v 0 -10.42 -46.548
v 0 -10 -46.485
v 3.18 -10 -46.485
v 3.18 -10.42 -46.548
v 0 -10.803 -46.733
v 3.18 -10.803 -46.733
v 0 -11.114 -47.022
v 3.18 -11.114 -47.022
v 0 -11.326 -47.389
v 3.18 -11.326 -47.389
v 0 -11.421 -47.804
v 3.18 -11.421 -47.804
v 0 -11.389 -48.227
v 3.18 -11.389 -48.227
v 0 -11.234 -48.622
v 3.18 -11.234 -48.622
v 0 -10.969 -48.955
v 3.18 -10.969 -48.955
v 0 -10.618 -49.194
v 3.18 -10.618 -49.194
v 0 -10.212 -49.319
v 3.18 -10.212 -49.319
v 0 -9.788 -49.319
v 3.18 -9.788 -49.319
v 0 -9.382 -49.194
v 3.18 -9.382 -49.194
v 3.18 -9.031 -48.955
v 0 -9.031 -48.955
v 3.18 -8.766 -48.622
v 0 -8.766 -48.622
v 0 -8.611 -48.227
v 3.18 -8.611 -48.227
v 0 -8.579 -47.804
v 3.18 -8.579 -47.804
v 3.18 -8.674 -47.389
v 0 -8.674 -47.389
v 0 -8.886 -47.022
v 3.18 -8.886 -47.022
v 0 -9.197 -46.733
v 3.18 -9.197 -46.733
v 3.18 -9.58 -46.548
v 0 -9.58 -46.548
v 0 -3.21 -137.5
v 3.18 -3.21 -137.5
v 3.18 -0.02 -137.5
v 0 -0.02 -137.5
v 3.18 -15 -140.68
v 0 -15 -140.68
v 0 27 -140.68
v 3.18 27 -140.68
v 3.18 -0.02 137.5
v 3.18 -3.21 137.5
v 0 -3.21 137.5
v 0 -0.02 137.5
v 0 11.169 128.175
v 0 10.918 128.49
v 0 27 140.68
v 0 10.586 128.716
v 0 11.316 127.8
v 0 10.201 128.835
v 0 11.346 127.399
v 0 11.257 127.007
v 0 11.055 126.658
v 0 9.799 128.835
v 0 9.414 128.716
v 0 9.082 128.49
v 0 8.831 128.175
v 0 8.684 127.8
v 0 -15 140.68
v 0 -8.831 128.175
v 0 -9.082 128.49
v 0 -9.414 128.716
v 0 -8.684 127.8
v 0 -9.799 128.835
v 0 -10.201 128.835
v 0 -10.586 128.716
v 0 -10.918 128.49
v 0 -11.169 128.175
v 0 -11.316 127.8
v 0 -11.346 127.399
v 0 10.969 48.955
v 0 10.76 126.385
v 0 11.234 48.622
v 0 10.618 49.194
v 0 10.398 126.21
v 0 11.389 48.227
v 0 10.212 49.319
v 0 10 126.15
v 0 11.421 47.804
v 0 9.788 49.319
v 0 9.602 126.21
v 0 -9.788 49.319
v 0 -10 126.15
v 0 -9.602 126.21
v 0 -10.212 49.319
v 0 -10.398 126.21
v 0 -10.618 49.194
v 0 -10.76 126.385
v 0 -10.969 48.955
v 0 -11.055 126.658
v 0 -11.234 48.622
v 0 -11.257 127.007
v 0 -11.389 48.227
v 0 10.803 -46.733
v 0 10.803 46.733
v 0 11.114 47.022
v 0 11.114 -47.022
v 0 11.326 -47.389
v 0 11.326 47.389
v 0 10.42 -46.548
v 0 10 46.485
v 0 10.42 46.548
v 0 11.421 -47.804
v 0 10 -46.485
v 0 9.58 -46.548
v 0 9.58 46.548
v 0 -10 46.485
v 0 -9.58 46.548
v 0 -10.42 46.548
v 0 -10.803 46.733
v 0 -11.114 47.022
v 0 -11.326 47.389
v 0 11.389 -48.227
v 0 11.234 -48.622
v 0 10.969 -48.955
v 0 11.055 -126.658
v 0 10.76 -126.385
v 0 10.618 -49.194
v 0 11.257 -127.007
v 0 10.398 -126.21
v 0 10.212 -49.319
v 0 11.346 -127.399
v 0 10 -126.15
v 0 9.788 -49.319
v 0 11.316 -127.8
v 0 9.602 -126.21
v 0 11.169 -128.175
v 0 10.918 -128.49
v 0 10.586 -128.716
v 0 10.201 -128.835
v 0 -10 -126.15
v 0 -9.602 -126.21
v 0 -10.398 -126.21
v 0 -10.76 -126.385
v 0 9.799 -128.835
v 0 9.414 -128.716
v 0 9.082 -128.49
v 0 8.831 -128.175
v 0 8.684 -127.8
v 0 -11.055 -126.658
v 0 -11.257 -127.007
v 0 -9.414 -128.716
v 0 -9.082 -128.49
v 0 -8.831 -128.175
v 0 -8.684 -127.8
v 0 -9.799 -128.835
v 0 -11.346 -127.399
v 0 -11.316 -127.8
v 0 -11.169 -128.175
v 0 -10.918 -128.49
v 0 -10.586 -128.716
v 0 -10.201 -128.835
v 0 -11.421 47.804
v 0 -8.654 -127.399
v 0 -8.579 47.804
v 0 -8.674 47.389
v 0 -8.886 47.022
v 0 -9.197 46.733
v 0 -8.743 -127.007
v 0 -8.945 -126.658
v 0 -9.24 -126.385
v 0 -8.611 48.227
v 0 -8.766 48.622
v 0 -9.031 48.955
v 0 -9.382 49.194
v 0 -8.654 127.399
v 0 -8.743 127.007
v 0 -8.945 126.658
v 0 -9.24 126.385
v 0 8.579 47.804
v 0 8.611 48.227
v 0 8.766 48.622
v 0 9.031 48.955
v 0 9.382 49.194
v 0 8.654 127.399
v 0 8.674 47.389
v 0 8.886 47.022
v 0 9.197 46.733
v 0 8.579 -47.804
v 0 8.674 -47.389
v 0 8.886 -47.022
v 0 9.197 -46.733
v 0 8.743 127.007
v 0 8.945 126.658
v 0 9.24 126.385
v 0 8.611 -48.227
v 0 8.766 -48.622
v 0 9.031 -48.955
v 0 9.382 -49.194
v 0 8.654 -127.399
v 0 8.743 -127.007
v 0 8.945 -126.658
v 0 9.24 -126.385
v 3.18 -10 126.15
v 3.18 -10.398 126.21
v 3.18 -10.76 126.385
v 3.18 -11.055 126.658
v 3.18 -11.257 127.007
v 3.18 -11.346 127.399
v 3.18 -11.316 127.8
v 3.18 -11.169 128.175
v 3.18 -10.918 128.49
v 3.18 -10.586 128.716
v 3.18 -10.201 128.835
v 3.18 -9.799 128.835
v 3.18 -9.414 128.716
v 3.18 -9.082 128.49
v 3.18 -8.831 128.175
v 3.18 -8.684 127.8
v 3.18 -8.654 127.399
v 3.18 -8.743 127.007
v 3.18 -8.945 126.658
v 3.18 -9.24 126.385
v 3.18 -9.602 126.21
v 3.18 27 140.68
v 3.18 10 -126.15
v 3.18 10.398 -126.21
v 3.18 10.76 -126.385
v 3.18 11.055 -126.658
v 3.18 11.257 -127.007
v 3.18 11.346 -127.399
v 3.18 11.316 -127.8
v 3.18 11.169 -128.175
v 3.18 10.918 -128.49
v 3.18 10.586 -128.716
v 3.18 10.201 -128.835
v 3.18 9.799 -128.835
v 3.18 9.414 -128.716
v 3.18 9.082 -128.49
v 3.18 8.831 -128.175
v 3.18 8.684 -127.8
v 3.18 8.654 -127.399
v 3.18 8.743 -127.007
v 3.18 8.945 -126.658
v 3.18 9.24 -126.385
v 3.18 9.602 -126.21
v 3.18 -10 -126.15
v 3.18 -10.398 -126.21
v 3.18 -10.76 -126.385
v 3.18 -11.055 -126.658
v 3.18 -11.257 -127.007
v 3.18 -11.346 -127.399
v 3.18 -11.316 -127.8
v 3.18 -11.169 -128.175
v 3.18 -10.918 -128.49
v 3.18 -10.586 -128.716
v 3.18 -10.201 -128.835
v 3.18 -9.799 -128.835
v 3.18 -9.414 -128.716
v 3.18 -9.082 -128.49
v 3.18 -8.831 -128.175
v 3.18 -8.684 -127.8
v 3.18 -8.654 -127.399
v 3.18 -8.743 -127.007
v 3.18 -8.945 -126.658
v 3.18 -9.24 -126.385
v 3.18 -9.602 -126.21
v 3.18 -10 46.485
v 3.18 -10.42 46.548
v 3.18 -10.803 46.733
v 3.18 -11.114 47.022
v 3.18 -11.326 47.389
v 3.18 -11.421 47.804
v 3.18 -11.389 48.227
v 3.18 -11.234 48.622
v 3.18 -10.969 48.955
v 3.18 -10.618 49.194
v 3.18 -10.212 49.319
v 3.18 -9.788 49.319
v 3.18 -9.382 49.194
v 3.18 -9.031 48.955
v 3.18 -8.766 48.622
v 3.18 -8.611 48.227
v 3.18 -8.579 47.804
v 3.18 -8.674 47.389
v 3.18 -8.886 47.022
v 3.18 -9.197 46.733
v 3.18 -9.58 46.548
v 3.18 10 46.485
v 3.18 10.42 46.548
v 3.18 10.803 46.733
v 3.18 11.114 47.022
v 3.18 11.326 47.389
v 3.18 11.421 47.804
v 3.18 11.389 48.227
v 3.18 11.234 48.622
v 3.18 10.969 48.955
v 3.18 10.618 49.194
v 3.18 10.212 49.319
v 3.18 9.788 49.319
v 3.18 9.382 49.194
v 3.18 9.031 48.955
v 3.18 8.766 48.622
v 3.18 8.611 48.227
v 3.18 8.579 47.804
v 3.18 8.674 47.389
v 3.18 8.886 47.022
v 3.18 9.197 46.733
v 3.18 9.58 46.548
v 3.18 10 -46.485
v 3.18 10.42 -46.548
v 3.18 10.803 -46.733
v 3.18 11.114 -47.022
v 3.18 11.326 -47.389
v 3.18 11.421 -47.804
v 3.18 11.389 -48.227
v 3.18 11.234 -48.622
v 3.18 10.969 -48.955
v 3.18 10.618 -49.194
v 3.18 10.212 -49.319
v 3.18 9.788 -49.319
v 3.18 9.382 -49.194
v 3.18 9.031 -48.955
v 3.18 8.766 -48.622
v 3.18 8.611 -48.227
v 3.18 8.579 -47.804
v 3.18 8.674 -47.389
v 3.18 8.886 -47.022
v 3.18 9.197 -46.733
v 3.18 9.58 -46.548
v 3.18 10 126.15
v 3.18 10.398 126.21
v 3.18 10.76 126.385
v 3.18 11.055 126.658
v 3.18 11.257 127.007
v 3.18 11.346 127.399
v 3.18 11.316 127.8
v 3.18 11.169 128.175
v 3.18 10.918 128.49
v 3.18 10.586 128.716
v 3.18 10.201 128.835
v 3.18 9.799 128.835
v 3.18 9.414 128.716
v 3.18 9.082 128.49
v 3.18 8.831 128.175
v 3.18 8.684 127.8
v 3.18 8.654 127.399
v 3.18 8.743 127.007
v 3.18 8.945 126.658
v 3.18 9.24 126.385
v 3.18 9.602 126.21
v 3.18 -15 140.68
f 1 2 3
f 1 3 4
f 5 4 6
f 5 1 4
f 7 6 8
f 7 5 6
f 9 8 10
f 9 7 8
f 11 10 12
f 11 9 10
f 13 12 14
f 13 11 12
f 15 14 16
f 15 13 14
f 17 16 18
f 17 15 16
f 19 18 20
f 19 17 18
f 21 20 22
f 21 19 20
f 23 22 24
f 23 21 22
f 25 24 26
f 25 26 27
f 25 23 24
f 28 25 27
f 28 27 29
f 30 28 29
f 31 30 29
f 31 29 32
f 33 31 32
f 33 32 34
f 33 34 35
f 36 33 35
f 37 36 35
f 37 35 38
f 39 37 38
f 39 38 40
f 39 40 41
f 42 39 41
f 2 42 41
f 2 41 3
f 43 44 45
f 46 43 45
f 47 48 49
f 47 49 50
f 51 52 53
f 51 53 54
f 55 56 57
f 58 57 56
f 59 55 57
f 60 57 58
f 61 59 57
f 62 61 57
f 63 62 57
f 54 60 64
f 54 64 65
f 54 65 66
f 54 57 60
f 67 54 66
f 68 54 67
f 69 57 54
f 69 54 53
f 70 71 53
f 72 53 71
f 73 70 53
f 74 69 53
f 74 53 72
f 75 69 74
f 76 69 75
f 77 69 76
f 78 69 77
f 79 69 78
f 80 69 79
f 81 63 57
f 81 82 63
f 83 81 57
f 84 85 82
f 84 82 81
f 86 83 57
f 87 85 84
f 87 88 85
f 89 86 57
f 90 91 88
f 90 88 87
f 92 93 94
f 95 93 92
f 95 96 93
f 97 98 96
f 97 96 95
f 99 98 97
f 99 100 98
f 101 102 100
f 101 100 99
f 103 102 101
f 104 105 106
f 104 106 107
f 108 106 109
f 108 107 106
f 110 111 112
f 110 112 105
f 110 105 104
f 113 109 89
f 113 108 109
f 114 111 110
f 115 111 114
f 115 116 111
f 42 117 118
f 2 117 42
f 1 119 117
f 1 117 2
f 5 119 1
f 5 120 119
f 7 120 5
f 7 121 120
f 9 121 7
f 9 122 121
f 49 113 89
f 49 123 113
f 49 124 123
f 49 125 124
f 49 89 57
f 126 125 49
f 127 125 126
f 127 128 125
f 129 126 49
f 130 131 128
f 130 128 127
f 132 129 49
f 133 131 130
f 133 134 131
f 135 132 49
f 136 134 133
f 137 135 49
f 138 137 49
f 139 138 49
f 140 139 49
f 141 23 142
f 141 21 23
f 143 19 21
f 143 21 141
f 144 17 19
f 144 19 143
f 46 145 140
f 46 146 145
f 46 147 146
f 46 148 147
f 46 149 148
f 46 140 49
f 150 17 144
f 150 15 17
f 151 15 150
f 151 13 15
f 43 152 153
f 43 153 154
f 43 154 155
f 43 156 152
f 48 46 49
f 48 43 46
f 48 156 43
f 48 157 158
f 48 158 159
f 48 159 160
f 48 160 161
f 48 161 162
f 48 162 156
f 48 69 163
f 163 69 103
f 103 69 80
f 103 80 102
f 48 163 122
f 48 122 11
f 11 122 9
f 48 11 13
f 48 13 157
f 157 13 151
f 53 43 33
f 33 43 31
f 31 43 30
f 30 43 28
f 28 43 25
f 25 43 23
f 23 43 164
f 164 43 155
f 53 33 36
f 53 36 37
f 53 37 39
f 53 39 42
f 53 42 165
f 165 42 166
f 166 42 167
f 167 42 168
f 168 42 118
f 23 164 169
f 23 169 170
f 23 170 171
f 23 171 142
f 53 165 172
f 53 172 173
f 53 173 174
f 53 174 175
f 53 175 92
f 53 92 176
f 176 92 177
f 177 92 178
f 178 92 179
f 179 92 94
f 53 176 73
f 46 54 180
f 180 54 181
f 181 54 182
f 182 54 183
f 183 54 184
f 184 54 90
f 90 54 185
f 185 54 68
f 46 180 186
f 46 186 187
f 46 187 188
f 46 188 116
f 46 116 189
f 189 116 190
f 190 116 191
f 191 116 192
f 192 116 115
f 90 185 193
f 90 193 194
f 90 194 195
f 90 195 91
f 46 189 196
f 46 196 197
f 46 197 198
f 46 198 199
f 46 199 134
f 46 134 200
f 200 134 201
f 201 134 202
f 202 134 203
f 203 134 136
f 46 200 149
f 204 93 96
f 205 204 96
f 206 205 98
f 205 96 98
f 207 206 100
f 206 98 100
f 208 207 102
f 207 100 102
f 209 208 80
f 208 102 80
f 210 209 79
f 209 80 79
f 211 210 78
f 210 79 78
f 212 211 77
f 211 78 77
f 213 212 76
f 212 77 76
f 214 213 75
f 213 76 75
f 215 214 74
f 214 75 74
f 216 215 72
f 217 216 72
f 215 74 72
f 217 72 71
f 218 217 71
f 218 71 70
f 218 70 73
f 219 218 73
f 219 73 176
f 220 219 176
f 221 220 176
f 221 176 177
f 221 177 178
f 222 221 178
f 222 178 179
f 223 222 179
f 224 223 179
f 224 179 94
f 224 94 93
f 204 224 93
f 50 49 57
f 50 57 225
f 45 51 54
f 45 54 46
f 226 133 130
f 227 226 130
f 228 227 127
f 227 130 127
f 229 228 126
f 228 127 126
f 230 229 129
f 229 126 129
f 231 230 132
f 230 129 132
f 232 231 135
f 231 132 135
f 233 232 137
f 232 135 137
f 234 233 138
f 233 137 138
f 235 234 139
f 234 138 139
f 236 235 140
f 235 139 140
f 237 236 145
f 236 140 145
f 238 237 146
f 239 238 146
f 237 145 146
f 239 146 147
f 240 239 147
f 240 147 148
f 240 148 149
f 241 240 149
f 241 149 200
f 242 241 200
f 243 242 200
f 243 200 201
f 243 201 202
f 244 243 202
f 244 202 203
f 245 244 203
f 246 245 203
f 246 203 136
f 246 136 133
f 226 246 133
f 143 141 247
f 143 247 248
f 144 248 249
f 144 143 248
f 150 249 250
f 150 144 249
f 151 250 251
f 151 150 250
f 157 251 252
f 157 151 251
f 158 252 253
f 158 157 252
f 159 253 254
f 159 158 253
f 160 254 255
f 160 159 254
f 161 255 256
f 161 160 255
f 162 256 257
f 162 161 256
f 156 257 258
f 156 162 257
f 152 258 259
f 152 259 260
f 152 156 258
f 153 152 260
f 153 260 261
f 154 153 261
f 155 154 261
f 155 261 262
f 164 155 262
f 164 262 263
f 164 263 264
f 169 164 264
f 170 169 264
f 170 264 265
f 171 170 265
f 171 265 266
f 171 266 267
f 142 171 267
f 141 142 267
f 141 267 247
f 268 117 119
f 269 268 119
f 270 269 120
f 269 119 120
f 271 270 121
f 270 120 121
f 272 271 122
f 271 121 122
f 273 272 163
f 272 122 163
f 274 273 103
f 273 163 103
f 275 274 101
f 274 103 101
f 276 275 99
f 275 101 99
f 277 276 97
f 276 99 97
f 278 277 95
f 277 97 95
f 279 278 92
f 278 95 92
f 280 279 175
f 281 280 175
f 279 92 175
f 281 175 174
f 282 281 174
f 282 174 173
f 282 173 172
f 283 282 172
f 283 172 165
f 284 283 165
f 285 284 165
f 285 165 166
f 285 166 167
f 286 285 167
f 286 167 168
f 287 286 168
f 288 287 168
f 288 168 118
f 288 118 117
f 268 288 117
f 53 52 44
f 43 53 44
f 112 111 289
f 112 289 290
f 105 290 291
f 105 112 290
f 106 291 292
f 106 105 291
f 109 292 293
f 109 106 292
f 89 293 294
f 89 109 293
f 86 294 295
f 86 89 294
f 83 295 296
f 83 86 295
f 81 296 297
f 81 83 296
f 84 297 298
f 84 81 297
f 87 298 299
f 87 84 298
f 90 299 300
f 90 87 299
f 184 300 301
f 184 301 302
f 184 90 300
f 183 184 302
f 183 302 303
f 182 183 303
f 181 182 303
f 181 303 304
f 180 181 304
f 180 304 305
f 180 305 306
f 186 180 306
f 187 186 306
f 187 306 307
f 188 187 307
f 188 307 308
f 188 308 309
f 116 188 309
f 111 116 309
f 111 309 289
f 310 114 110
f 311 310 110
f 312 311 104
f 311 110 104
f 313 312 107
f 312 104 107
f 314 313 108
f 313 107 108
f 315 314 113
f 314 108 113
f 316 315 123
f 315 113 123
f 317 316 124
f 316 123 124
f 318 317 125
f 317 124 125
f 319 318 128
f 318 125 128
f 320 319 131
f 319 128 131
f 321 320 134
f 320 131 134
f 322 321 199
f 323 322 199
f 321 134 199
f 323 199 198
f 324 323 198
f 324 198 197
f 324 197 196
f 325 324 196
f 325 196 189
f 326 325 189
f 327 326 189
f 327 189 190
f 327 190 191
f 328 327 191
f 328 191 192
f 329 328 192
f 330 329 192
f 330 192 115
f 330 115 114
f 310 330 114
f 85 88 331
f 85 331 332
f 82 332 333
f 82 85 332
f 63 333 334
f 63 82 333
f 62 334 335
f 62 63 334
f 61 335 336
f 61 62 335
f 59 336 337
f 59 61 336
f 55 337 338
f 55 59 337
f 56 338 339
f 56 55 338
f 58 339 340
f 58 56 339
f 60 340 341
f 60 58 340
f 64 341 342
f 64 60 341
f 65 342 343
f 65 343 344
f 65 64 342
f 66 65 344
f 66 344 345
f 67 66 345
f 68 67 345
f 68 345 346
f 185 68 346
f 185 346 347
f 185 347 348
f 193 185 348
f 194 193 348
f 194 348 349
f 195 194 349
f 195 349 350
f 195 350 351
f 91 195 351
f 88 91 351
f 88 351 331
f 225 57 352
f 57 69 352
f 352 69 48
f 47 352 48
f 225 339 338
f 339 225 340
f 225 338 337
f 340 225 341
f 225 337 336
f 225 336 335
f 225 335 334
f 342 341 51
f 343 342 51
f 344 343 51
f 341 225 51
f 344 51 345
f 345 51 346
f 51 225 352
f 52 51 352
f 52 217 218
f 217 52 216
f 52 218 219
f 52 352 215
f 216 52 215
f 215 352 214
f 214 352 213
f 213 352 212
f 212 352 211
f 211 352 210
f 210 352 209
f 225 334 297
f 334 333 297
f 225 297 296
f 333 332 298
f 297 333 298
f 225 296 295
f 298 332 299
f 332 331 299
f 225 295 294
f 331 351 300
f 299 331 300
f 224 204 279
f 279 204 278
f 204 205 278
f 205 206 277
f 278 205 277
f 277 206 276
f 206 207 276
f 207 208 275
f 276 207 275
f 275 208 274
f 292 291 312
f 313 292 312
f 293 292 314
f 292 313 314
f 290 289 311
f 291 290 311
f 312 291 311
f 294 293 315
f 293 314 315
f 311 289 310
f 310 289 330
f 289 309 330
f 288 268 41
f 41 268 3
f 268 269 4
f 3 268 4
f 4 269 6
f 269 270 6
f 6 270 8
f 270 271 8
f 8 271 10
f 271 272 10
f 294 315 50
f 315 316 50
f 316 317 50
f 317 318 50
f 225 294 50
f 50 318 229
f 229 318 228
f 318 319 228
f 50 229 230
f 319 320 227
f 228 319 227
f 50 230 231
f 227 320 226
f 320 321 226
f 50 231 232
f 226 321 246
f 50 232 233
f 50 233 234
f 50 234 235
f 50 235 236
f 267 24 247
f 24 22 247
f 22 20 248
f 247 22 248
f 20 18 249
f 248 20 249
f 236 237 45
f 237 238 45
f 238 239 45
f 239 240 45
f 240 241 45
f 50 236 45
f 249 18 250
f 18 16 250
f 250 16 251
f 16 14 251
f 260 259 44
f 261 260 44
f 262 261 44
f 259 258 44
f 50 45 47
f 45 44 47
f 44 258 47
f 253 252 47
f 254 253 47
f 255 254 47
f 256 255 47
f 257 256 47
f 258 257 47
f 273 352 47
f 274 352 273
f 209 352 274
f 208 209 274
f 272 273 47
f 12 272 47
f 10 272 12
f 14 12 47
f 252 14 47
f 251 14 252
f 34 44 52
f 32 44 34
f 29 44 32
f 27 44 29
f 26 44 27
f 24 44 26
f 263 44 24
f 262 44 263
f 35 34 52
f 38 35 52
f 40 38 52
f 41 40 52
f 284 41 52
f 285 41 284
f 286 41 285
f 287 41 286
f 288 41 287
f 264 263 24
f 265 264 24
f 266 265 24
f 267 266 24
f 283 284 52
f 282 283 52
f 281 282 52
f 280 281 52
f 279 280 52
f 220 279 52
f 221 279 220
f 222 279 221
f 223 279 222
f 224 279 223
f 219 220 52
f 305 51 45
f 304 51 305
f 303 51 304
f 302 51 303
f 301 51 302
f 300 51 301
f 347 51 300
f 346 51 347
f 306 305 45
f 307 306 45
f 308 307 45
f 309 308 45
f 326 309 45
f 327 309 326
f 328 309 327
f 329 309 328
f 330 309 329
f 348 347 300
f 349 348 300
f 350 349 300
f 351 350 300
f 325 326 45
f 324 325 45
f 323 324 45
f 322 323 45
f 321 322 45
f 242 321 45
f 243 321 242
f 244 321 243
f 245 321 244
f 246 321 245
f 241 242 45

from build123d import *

# Parameters (mm, degrees)
SKETCH1_W                 = 281.36
SKETCH1_H                 = 30
BOSS_EXTRUDE1_DEPTH       = 3.18
CUT_EXTRUDE1_REACH        = 143.513
SKETCH2_R                 = 1.35
SKETCH2_R_2               = 1.425
MIRROR2_COPY_1_REACH      = 143.513
MIRROR2_COPY_1_SKETCH_R   = 1.35
MIRROR2_COPY_1_SKETCH_R_2 = 1.425
SKETCH3_W                 = 275
SKETCH3_H                 = 3.19
CUT_EXTRUDE2_DEPTH        = 3.18
SKETCH4_W                 = 3.18
SKETCH4_H                 = 281.36
BOSS_EXTRUDE2_DEPTH       = 12


with BuildPart() as part:
    # Sketch1 → Boss-Extrude1 (new body)
    with BuildSketch(Plane(origin=(0, 0, 0), x_dir=(0, 0, -1), z_dir=(1, 0, 0))):
        Rectangle(SKETCH1_W, SKETCH1_H)
    extrude(amount=BOSS_EXTRUDE1_DEPTH)

    # Sketch2 → Cut-Extrude1 (cut, up to next)
    with BuildSketch(Plane.ZY, mode=Mode.PRIVATE) as cut_extrude1_sk1:
        with Locations((-127.5, 10)):
            Circle(SKETCH2_R)
    cut_extrude1_tool1 = extrude(cut_extrude1_sk1.sketch, amount=-CUT_EXTRUDE1_REACH, mode=Mode.PRIVATE) & part.part
    # Sketch2 → Cut-Extrude1 (cut, up to next)
    with BuildSketch(Plane.ZY, mode=Mode.PRIVATE) as cut_extrude1_sk2:
        with Locations((-47.91, 10)):
            Circle(SKETCH2_R_2)
    cut_extrude1_tool2 = extrude(cut_extrude1_sk2.sketch, amount=-CUT_EXTRUDE1_REACH, mode=Mode.PRIVATE) & part.part
    cut_extrude1_1 = cut_extrude1_tool1.solids().sort_by_distance((0, 10, -127.5))[0]
    add(cut_extrude1_1, mode=Mode.SUBTRACT)
    cut_extrude1_2 = cut_extrude1_tool2.solids().sort_by_distance((0, 10, -47.91))[0]
    add(cut_extrude1_2, mode=Mode.SUBTRACT)
    cut_extrude1 = cut_extrude1_1 + cut_extrude1_2  # Cut-Extrude1 as one shape, for the pattern or mirror that repeats it

    # Mirror1: Cut-Extrude1 across plane
    add(cut_extrude1.mirror(Plane.ZX), mode=Mode.SUBTRACT)

    # Mirror2: Cut-Extrude1 across plane
    add(cut_extrude1.mirror(Plane.XY), mode=Mode.SUBTRACT)

    # Mirror2 copy 1 sketch → Mirror2 copy 1 (cut, up to next)
    with BuildSketch(Plane(origin=(0, 0, 0), x_dir=(0, 0, -1), z_dir=(-1, 0, 0)), mode=Mode.PRIVATE) as mirror2_copy_1_sk1:
        with Locations((-127.5, 10)):
            Circle(MIRROR2_COPY_1_SKETCH_R)
    mirror2_copy_1_tool1 = extrude(mirror2_copy_1_sk1.sketch, amount=-MIRROR2_COPY_1_REACH, mode=Mode.PRIVATE) & part.part
    # Mirror2 copy 1 sketch → Mirror2 copy 1 (cut, up to next)
    with BuildSketch(Plane(origin=(0, 0, 0), x_dir=(0, 0, -1), z_dir=(-1, 0, 0)), mode=Mode.PRIVATE) as mirror2_copy_1_sk2:
        with Locations((-47.91, 10)):
            Circle(MIRROR2_COPY_1_SKETCH_R_2)
    mirror2_copy_1_tool2 = extrude(mirror2_copy_1_sk2.sketch, amount=-MIRROR2_COPY_1_REACH, mode=Mode.PRIVATE) & part.part
    add(mirror2_copy_1_tool1.solids().sort_by_distance((0, -10, 127.5))[0], mode=Mode.SUBTRACT)
    add(mirror2_copy_1_tool2.solids().sort_by_distance((0, -10, 47.91))[0], mode=Mode.SUBTRACT)

    # Sketch3 → Cut-Extrude2 (cut)
    with BuildSketch(Plane(origin=(3.18, 0, 0), x_dir=(0, 0, -1), z_dir=(1, 0, 0))):
        with Locations((0, -1.615)):
            Rectangle(SKETCH3_W, SKETCH3_H)
    extrude(amount=-CUT_EXTRUDE2_DEPTH, mode=Mode.SUBTRACT)

    # Sketch4 → Boss-Extrude2 (add)
    with BuildSketch(Plane(origin=(0, 15, 0), x_dir=(1, 0, 0), z_dir=(0, 1, 0))):
        with Locations((1.59, 0)):
            Rectangle(SKETCH4_W, SKETCH4_H)
    extrude(amount=BOSS_EXTRUDE2_DEPTH)


solid = part.part
